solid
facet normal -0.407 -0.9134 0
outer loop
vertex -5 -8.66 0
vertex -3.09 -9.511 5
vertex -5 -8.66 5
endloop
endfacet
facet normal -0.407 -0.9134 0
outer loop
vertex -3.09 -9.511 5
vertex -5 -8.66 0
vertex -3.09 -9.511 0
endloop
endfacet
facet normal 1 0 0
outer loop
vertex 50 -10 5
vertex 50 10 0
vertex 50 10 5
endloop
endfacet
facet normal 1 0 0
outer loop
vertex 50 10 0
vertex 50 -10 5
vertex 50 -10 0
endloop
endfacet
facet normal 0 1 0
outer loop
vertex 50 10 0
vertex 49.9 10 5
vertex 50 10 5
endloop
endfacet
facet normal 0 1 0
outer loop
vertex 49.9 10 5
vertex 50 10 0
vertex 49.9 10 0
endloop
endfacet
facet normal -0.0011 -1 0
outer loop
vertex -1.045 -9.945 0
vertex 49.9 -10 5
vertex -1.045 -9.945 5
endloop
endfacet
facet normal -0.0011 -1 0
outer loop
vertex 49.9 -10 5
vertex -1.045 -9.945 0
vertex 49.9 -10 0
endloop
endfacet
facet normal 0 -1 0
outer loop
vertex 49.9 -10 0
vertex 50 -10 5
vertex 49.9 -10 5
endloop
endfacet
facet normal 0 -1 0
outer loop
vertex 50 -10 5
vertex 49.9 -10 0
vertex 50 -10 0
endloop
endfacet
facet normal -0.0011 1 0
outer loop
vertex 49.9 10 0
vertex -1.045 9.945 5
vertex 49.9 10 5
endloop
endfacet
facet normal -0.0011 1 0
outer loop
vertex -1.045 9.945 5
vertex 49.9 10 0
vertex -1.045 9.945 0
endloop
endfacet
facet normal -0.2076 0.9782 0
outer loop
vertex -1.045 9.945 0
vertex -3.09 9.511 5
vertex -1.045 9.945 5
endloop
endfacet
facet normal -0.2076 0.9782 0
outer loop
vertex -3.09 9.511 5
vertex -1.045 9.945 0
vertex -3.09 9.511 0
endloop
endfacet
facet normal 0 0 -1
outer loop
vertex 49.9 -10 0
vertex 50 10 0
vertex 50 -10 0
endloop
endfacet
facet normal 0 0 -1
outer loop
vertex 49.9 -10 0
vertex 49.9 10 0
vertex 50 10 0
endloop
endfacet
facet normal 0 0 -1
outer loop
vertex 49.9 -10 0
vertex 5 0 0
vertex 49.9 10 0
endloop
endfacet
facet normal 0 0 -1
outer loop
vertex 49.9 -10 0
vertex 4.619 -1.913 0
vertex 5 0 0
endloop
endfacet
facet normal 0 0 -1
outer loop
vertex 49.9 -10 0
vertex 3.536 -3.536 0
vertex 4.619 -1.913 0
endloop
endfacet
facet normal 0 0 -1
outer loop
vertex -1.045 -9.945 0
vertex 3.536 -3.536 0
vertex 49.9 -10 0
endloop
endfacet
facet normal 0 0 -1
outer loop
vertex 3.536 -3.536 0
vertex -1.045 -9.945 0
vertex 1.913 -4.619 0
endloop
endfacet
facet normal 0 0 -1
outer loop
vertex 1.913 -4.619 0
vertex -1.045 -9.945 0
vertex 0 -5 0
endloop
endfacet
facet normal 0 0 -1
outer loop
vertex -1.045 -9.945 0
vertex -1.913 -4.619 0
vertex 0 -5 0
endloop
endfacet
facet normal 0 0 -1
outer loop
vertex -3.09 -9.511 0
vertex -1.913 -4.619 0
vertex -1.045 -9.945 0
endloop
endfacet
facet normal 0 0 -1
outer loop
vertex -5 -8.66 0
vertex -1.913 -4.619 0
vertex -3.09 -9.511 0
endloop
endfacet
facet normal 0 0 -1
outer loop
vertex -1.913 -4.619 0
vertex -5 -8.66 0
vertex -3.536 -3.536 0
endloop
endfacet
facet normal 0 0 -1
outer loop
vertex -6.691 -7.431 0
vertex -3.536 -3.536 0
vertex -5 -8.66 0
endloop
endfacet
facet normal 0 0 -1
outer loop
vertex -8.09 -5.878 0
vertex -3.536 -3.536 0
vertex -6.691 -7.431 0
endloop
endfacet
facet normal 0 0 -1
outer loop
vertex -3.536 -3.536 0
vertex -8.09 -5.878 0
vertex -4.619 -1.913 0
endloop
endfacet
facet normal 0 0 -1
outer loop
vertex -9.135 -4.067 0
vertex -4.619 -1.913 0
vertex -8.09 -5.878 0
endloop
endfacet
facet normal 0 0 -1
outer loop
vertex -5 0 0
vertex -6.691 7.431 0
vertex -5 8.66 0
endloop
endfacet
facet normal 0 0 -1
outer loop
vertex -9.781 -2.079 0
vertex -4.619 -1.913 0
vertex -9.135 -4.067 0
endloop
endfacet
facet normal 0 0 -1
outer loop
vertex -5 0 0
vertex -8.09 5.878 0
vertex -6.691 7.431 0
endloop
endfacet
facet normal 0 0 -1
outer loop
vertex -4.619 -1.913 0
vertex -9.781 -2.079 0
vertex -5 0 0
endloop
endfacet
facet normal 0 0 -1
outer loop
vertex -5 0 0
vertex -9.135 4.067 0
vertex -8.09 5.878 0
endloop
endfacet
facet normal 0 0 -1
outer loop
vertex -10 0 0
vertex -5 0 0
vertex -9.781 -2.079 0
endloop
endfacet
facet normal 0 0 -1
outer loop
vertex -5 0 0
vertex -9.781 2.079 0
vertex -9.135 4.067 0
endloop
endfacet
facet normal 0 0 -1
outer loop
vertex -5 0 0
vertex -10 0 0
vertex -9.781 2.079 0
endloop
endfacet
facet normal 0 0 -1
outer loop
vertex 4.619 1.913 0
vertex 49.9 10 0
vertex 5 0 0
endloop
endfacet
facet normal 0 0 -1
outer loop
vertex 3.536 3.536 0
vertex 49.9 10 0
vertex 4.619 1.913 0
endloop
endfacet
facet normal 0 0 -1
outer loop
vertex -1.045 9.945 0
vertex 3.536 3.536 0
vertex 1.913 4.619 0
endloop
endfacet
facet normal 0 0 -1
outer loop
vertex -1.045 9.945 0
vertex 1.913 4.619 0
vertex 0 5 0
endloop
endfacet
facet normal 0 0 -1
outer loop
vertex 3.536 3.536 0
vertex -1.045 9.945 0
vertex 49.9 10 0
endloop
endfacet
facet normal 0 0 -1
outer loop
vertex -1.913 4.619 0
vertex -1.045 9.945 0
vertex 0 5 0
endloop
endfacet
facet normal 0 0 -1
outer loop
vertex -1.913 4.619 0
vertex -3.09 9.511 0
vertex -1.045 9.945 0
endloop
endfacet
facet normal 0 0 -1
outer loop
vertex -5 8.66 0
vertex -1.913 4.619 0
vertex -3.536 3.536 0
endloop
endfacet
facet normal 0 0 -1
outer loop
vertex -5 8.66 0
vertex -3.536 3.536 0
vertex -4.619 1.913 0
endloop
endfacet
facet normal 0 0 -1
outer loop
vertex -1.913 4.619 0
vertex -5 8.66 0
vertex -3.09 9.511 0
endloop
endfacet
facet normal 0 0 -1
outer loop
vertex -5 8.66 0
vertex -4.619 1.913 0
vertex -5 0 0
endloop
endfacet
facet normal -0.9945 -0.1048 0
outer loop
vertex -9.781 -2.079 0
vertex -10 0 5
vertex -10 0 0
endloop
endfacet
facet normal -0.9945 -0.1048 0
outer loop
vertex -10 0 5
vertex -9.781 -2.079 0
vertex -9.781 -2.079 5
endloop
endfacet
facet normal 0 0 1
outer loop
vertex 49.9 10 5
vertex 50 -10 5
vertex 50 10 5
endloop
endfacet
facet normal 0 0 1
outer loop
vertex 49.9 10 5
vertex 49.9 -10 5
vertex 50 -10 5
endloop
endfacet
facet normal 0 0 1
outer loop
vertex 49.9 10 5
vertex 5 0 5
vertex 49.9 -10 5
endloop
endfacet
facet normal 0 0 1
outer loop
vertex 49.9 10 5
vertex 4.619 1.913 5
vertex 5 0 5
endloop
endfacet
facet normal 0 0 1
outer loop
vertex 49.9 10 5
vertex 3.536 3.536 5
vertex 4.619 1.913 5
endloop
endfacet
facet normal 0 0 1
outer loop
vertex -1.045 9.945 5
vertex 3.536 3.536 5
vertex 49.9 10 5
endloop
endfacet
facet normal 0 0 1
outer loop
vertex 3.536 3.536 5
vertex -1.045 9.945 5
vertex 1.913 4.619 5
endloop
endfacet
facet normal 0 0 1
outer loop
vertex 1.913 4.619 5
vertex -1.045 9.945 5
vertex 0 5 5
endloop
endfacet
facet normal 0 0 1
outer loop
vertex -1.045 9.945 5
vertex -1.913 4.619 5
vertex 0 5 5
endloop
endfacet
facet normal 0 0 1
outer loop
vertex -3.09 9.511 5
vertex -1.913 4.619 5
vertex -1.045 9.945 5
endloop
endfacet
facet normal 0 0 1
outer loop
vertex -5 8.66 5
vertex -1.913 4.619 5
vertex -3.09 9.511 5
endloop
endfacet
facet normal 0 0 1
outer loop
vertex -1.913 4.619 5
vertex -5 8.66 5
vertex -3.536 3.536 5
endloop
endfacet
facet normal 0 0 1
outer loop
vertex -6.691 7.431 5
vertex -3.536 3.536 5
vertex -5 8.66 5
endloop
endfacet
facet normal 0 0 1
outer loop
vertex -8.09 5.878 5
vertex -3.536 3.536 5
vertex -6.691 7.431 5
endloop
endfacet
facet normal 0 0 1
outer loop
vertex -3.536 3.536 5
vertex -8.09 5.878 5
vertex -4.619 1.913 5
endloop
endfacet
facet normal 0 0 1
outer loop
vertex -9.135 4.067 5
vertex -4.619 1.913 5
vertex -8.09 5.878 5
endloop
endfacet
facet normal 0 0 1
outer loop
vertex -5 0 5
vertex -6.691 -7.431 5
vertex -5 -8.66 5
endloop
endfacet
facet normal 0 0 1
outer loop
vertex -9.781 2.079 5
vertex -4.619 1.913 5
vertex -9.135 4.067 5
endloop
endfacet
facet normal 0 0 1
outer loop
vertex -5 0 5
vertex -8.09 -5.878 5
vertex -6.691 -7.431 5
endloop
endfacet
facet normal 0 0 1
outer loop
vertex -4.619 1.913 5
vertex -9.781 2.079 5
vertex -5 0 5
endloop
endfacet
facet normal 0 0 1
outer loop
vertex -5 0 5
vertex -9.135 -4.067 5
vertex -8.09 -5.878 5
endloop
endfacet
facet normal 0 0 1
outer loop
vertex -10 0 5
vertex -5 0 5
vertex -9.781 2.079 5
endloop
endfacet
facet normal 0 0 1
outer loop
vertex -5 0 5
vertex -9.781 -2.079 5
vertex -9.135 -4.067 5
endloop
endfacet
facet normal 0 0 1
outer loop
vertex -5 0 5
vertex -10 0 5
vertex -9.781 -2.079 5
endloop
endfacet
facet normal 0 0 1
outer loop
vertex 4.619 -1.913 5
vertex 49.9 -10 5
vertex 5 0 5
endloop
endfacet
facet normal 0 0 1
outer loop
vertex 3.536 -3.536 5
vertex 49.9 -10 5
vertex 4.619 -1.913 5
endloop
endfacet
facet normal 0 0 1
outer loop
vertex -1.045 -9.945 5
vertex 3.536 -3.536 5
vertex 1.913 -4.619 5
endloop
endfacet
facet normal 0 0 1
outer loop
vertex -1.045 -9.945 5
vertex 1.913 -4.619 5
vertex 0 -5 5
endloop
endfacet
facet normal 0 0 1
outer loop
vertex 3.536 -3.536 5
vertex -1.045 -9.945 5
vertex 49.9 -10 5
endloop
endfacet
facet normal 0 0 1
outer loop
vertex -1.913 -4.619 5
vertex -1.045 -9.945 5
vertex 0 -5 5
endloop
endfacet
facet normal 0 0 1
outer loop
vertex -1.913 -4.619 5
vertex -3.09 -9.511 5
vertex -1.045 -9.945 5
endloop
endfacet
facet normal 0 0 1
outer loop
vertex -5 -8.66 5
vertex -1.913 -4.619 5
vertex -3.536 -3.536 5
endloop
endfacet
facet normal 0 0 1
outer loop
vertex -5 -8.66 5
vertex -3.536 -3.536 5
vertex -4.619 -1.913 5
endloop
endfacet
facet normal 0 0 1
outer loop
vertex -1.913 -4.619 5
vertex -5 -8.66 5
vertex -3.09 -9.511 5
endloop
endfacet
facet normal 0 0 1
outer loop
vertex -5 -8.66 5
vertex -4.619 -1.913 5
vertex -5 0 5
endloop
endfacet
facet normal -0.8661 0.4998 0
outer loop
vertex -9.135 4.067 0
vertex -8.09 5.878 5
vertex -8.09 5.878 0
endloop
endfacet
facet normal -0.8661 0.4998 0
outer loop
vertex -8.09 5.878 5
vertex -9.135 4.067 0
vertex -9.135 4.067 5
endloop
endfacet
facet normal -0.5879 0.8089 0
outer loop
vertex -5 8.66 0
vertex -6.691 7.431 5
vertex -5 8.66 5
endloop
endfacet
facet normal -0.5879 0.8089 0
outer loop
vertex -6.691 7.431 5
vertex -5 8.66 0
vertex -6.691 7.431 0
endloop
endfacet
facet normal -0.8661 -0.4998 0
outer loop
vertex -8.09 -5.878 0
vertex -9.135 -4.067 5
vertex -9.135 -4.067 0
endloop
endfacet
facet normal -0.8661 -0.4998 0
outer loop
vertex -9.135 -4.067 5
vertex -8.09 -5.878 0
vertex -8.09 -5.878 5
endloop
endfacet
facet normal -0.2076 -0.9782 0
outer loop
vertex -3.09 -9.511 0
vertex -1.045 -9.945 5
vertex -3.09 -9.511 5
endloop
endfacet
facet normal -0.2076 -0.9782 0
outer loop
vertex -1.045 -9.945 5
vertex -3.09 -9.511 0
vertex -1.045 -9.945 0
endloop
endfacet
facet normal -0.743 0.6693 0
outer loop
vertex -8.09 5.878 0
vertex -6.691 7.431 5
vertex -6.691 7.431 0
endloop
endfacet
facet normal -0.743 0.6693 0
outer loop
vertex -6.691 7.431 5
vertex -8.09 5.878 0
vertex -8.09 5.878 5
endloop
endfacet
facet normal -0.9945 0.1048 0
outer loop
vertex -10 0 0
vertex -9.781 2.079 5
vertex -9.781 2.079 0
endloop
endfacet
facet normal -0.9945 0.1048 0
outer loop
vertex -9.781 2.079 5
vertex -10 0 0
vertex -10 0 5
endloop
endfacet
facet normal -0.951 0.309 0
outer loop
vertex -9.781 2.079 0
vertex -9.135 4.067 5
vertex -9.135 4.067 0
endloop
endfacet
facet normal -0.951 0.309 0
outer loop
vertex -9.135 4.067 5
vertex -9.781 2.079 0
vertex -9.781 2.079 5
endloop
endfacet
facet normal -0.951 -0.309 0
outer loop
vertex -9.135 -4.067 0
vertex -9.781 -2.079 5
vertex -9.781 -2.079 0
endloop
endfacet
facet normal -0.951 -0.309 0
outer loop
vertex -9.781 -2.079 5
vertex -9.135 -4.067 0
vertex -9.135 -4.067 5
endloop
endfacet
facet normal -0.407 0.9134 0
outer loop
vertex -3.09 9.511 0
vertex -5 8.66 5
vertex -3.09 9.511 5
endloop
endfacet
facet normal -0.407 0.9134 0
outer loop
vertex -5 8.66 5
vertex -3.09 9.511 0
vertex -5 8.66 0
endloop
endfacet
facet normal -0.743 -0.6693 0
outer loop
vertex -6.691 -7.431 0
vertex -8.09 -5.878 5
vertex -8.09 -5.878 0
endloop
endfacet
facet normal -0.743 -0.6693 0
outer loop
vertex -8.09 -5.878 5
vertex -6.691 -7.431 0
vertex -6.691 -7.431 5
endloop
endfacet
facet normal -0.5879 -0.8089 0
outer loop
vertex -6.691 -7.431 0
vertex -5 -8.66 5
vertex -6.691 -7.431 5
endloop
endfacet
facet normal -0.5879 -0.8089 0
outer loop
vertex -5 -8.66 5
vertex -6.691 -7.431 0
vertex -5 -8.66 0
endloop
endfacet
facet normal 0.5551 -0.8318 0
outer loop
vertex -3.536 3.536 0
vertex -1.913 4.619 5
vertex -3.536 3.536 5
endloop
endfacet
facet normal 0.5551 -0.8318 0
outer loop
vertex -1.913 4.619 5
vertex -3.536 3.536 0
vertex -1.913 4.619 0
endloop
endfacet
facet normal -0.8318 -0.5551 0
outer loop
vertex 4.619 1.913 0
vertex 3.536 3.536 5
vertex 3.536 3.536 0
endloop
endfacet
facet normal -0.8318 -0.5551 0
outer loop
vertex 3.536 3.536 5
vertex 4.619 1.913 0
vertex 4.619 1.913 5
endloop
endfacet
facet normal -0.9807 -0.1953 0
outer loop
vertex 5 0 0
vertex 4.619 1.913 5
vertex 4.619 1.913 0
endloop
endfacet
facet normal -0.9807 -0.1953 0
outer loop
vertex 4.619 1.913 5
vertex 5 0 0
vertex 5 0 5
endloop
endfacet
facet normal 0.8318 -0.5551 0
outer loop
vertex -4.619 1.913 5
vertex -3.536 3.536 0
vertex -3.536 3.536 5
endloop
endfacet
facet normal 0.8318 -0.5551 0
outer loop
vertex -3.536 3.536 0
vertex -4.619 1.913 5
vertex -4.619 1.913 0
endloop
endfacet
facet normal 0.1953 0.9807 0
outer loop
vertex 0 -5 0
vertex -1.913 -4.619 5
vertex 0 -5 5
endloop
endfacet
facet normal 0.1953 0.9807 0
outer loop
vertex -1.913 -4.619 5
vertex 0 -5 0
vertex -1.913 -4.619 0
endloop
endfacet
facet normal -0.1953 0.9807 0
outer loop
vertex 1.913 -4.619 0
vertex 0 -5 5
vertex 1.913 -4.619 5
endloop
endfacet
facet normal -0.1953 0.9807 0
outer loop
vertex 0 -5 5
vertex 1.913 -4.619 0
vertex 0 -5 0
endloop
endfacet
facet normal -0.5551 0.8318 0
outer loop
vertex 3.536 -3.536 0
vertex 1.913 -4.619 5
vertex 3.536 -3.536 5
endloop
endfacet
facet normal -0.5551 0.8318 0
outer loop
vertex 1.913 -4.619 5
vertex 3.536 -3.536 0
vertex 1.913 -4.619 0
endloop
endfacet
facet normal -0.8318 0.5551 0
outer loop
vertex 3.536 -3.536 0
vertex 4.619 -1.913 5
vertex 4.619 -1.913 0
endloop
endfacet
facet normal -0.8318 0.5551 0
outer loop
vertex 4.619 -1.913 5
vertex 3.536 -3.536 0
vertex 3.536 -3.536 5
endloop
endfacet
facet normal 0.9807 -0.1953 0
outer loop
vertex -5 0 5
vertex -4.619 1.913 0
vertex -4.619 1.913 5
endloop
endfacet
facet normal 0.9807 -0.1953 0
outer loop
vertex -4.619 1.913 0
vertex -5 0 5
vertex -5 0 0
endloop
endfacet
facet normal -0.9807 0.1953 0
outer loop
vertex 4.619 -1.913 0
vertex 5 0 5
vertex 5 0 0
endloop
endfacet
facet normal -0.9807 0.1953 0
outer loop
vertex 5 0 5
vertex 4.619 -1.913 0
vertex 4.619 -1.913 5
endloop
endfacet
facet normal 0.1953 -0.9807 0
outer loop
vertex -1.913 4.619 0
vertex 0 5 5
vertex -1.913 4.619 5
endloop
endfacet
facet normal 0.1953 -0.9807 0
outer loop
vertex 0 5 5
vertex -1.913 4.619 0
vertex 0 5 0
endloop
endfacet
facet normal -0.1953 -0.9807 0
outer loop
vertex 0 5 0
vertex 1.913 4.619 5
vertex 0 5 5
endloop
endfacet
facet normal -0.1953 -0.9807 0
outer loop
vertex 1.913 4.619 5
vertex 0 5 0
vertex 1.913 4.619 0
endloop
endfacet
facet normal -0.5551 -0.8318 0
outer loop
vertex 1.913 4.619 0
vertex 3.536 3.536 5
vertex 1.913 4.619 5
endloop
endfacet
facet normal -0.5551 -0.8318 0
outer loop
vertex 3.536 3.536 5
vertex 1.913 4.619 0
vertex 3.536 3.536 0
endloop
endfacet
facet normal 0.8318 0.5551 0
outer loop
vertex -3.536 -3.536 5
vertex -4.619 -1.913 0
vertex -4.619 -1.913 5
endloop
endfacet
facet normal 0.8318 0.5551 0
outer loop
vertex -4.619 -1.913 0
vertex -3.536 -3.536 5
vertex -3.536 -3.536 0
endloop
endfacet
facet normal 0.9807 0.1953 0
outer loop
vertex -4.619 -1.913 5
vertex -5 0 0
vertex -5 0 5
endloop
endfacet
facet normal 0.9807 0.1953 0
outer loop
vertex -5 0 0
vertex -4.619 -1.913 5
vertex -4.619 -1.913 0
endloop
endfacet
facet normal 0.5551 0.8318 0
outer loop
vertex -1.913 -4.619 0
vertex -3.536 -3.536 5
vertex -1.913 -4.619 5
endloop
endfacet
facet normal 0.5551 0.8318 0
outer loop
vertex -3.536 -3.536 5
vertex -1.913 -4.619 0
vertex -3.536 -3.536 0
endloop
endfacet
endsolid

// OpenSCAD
module hole_tab(dia,hole_dia,l_centre_to_end,tab_thk)
{
    difference()
    {
        hull()
        {
            cylinder(d=dia,h=tab_thk);
            translate([l_centre_to_end-0.1,-dia/2,0])
                cube([0.1,dia,tab_thk]);
        }
        //hole
        cylinder(d=hole_dia,h=tab_thk);
    }
}

hole_tab(20,10,50,5);
